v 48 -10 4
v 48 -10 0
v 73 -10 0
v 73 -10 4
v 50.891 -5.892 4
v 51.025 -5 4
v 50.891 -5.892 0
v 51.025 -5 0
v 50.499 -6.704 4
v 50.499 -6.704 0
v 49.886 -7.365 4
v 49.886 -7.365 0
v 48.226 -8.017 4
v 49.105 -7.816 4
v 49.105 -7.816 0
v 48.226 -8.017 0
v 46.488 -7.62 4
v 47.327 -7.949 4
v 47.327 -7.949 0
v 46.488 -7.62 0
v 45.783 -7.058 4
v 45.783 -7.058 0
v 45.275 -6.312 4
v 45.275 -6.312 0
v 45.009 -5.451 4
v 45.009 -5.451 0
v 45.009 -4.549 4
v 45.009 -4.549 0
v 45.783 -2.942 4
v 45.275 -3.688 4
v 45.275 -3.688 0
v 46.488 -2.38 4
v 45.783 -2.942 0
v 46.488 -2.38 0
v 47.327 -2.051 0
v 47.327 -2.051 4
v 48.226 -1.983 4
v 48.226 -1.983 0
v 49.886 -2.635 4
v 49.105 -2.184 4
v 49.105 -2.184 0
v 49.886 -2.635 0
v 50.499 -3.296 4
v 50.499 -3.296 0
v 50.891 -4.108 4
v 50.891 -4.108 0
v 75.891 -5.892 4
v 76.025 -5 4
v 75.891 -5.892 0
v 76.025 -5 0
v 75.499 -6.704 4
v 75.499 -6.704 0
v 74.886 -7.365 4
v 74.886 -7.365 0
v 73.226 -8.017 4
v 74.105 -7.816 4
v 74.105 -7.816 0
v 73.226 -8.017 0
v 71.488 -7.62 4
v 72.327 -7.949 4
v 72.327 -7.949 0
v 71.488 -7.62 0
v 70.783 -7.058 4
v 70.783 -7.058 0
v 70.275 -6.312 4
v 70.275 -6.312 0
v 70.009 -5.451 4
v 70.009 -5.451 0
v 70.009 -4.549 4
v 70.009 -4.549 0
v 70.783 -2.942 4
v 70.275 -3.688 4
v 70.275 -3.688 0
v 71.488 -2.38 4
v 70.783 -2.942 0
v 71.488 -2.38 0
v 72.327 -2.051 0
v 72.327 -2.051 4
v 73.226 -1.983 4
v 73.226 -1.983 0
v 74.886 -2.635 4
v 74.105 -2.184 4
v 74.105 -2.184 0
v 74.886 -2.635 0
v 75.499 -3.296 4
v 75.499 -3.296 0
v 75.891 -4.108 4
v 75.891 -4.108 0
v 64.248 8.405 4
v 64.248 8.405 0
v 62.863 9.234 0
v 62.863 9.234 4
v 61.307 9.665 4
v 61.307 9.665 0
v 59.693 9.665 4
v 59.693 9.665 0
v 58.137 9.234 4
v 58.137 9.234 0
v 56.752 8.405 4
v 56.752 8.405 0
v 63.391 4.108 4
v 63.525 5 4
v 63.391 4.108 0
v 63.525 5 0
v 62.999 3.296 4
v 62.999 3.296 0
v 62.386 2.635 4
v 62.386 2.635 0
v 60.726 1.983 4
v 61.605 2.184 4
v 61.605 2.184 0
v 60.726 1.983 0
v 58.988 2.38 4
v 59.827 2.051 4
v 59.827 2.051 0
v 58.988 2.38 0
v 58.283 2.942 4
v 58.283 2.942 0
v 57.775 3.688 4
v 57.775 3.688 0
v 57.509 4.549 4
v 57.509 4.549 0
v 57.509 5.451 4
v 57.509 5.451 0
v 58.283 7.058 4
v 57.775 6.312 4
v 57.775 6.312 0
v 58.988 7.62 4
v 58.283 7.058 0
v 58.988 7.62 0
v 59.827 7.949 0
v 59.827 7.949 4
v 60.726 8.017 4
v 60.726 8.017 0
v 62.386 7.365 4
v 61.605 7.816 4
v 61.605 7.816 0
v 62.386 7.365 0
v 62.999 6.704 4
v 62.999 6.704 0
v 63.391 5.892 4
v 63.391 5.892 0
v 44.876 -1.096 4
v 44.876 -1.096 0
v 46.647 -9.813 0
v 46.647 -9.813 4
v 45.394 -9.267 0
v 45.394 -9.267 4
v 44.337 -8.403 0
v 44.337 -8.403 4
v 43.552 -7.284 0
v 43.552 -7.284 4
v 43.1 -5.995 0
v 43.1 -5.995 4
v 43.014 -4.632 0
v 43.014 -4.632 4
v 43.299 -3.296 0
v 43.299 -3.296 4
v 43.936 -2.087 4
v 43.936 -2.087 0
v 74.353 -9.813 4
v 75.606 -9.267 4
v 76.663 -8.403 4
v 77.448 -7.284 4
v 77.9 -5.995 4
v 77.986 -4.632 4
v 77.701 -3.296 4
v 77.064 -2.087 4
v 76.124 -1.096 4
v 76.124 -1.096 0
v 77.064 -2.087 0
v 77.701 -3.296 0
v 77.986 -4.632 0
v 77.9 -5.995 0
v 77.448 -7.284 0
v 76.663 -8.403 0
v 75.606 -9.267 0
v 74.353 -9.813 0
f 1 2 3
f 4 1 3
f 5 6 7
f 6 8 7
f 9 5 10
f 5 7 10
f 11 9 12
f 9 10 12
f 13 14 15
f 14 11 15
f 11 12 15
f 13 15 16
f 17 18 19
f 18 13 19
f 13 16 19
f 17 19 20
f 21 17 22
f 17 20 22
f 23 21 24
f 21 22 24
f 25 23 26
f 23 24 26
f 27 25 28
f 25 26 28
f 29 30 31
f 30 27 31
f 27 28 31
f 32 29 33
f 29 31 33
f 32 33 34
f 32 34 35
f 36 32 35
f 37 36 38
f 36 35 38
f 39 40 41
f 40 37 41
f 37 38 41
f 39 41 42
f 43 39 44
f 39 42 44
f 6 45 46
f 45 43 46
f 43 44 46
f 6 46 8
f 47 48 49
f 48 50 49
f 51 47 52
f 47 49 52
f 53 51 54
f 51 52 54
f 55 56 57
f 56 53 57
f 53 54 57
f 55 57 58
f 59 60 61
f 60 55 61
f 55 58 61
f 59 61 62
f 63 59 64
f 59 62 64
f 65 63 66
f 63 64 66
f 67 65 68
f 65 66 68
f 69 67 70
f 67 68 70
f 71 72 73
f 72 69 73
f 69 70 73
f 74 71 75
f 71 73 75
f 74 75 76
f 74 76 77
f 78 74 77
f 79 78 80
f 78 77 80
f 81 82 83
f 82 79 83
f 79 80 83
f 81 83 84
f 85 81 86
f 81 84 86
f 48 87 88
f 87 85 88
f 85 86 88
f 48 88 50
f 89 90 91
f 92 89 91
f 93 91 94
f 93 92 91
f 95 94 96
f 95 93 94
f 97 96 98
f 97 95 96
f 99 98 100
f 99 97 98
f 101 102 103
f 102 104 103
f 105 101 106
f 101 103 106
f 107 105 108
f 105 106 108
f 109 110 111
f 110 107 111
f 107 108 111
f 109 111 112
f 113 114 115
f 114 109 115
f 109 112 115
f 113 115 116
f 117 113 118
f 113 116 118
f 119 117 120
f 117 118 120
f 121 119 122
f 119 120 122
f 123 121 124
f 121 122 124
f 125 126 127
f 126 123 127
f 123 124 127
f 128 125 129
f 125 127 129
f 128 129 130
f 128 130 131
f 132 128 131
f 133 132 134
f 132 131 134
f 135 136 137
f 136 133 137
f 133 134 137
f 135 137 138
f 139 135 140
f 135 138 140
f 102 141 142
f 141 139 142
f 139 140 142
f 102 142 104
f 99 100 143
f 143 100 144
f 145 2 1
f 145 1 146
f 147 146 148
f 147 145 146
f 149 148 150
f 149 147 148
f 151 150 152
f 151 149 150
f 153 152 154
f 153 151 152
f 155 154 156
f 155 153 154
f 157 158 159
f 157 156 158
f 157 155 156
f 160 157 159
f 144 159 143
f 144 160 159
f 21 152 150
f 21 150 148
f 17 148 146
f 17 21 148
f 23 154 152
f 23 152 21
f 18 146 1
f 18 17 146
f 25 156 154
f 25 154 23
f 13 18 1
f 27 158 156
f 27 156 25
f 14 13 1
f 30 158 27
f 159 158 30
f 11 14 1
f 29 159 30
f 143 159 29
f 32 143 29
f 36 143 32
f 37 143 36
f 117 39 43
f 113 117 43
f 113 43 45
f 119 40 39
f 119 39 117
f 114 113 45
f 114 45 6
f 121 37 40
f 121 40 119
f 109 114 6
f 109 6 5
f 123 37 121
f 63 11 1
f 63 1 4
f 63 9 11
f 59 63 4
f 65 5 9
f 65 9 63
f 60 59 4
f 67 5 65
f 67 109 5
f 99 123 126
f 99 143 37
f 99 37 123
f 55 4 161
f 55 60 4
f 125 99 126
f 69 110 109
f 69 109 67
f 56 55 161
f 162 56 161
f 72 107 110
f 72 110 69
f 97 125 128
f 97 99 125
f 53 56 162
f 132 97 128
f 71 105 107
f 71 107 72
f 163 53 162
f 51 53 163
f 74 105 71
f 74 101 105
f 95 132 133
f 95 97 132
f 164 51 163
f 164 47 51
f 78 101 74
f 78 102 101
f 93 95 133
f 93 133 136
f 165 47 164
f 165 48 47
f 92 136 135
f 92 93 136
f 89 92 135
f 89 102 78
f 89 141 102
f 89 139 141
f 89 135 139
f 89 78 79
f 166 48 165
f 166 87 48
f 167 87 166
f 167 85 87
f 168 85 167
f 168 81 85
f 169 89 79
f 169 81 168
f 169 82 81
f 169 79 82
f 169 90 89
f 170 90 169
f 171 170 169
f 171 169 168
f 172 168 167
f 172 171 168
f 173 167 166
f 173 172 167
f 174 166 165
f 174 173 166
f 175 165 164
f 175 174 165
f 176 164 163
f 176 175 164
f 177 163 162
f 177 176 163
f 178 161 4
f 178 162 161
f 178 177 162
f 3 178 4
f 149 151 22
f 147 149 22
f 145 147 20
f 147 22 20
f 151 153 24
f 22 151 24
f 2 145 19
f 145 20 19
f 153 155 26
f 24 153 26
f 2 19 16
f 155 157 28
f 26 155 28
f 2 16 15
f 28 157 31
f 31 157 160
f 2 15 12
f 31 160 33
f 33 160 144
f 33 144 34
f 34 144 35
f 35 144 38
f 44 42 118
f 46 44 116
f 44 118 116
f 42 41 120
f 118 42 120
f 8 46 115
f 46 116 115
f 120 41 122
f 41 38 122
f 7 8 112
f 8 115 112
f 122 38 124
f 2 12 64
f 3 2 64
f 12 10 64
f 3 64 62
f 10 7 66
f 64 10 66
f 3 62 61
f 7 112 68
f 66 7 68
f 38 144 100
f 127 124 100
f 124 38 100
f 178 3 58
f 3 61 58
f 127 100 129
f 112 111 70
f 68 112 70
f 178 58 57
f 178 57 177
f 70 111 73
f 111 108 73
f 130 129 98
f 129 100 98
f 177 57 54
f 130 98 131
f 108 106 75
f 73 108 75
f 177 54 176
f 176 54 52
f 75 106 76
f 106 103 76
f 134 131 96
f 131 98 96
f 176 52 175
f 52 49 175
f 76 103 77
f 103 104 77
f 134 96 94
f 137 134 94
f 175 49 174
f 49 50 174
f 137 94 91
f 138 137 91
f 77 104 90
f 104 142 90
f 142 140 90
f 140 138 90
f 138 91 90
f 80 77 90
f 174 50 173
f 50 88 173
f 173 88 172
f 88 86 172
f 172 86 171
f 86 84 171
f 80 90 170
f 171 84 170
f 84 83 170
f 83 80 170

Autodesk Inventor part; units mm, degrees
ref_plane "YZ Plane" through (0, 0, 0) normal (1, 0, 0) x (0, 1, 0)
ref_plane "XZ Plane" through (0, 0, 0) normal (0, 1, 0) x (-1, 0, 0)
ref_plane "XY Plane" through (0, 0, 0) normal (0, 0, 1) x (1, 0, 0)
sketch "スケッチ1" plane through (0, 0, 0) normal (0, 0, 1) x (1, 0, 0)
  line L0 (92.493, 12) -> (30.0122, 12)
  arc A0 (30.0122, 12) -> (23.3428, 9.9759) centre (30.0122, 0) ccw
  arc A1 (6.6694, 9.9759) -> (23.3428, 9.9759) centre (15.0061, 22.4459) ccw
  arc A2 (6.6694, 9.9759) -> (0, -12) centre (0, 0) ccw
  line L1 (0, -12) -> (30, -12)
  arc A3 (30, -12) -> (30, -12) centre (30, 0) ccw construction
  line L2 (30, -12) -> (92.493, -12)
  line L3 (92.493, -12) -> (92.493, 12)
  circle A4 centre (30, 0) radius 9.025 construction
  circle A5 centre (0, 0) radius 1.5
  circle A6 centre (16, 0) radius 1.25
  circle A7 centre (48, -5) radius 3.025
  circle A8 centre (73, -5) radius 3.025
  circle A9 centre (60.5, 5) radius 3.025
  line L4 (48, -5) -> (73, -5) construction
  line L5 (92.493, 12) -> (30.0122, 12)
  line L6 (59.7539, 12) -> (92.493, -14.1913)
  line L7 (92.493, -12) -> (92.493, 12)
  line L8 (60.5, 5) -> (73, -5) construction
  line L9 (60.5, 5) -> (60.5, -5) construction
  line L10 (61.2461, 12) -> (28.507, -14.1913)
  arc A10 (44.8765, -1.0957) -> (48, -10) centre (48, -5) ccw
  arc A11 (73, -10) -> (76.1235, -1.0957) centre (73, -5) ccw
  line L11 (48, -10) -> (73, -10)
  point P0 (60.5, 0)
  point P1 (61.3547, 12)
  point P2 (91.3547, -12)
  point P3 (59.6453, 12)
  point P4 (29.6453, -12)
  point P5 (89.7539, -12)
  point P6 (60.5, 11.4031)
  point P7 (31.2461, -12)
  dimension "d0" = 6.05
  dimension "d1" = 6.05
  dimension "d2" = 6.05
  dimension "d3" = 25
  dimension "d4" = 10
  dimension "d5" = 18
  dimension "d6" = 5
extrude "押し出し1" add sketch "スケッチ1" along normal blind 4 contours L6 A11 L11 A10 L10
fillet "フィレット3" radius 6 1 edges at (60.5, 11.4031, 2)
properties part number "アーム詰め物" material "ポリカーボネート、クリア"
